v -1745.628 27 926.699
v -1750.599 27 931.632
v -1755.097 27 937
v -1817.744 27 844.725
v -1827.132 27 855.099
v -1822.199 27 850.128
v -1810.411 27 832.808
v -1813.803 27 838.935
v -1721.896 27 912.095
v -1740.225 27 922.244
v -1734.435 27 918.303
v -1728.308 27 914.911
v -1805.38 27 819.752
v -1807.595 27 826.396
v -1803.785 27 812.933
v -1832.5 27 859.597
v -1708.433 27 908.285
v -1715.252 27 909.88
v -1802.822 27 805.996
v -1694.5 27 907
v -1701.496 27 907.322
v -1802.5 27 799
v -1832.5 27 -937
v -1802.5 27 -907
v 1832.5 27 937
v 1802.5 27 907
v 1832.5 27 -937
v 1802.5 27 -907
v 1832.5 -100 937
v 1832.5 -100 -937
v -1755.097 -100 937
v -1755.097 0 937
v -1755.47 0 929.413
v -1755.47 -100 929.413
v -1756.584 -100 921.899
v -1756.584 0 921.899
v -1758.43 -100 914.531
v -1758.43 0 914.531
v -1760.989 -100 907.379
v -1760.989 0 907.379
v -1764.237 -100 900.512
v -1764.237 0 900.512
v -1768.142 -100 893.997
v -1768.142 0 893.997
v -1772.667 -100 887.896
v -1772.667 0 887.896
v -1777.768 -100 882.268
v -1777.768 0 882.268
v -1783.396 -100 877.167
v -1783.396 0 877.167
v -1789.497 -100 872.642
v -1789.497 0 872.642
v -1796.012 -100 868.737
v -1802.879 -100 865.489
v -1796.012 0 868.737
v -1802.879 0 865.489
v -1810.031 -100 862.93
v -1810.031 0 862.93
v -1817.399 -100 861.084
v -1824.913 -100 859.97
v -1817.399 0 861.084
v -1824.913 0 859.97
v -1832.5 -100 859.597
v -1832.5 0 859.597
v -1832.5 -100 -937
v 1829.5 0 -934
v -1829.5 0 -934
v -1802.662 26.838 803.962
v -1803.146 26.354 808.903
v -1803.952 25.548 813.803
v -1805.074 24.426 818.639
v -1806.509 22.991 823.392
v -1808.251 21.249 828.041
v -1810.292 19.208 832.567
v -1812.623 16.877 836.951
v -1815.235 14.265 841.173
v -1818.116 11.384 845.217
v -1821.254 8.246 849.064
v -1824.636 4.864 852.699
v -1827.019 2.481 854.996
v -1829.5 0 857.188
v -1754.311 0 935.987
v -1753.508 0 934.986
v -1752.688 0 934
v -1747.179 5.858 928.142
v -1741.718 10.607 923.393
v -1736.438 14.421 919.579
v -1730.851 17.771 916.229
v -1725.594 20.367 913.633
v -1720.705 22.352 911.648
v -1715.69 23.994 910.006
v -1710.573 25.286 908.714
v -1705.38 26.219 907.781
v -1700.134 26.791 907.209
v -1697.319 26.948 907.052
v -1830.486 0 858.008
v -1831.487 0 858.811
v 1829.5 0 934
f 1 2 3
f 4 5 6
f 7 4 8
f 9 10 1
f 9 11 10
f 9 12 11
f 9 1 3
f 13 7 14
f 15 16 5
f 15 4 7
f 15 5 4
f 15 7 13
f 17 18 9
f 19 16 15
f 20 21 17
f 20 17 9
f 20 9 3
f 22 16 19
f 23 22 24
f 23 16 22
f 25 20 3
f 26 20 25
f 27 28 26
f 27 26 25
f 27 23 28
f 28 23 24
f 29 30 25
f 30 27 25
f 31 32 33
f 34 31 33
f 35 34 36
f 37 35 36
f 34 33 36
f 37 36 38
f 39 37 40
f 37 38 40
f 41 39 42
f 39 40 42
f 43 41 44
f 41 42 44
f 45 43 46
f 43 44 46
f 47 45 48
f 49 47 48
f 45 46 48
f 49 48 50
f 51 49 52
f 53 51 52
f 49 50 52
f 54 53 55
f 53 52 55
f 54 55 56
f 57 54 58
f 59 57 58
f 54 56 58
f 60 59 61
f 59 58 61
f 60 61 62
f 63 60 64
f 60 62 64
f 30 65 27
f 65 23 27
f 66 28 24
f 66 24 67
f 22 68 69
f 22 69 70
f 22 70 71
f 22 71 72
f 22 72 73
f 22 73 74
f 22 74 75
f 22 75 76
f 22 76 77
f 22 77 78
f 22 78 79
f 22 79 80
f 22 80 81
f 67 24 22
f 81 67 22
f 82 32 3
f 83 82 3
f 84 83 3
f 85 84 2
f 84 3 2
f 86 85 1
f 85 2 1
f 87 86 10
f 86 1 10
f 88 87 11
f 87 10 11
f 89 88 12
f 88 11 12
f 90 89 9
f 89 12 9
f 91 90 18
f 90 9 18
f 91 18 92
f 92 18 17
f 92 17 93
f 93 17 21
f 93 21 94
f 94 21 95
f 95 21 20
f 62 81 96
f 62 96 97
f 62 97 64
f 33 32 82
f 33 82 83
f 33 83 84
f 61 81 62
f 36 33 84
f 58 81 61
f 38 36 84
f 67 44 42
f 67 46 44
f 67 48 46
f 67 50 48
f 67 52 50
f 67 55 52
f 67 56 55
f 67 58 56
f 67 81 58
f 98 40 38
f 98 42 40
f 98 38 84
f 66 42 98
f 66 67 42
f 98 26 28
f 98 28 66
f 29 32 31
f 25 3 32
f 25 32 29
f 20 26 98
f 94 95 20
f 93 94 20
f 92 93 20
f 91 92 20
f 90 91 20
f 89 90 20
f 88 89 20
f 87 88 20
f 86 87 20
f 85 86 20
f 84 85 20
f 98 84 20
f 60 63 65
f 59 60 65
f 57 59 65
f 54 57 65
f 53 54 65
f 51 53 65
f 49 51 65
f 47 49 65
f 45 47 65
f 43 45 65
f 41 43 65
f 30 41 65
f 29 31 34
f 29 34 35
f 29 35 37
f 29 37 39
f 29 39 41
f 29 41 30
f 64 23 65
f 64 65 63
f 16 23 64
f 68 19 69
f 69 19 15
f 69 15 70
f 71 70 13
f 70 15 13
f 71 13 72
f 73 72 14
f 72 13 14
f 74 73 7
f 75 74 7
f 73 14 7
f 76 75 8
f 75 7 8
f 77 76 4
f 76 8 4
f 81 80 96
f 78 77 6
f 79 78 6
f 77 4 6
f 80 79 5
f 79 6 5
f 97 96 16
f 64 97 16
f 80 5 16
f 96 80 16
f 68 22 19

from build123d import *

# Parameters (mm, degrees)
SZKIC4_W                    = 3665
SZKIC4_H                    = 1874
SZKIC4_W_2                  = 3569
SZKIC4_H_2                  = 1778
DODANIE_WYCI_GNI_CIE3_DEPTH = 27
SZKIC5_W                    = 3665
SZKIC5_H                    = 1874
DODANIE_WYCI_GNI_CIE4_DEPTH = 100
WYTNIJ_WYCI_GNI_CIE1_DEPTH  = 27
WYTNIJ_WYCI_GNI_CIE2_REACH  = 2062.589
SZKIC7_R                    = 77.40297037


with BuildPart() as part:
    # Szkic4 → Dodanie-wyciągnięcie3 (new body)
    with BuildSketch(Plane(origin=(0, 0, 0), x_dir=(1, 0, 0), z_dir=(0, 1, 0))):
        Rectangle(SZKIC4_W, SZKIC4_H)
        Rectangle(SZKIC4_W_2, SZKIC4_H_2, mode=Mode.SUBTRACT)
    extrude(amount=DODANIE_WYCI_GNI_CIE3_DEPTH)

    # Sfazowanie1
    # the kernel refuses this chamfer: 45 mm, written as the material it takes off along each edge
    with BuildSketch(Plane(origin=(-1784.5, 0, 889), x_dir=(0, 0.9996219169112966, -0.027495876610587087), z_dir=(1, 0, 0)), Plane(origin=(1784.5, 0, -889), x_dir=(0, 0.9996219169112966, 0.027495876610587087), z_dir=(-1, 0, 0))) as sfazowanie1_piece_1:
        with BuildLine():
            Line((46.290293783, 0), (-2.54462197, 46.220300708))
            Line((-2.54462197, 46.220300708), (-3.444281695, 46.19555442))
            ThreePointArc((-3.444281695, 46.19555442), (-1.535815218, 23.102902334), (-0.899659725, -0.024746289))
            Line((-0.899659725, -0.024746289), (0.024746289, -0.899659725))
            ThreePointArc((0.024746289, -0.899659725), (23.152394912, -0.263504233), (46.315040072, -0.899659725))
            Line((46.315040072, -0.899659725), (46.290293783, 0))
        make_face()
    extrude(amount=3569, mode=Mode.SUBTRACT)
    with BuildSketch(Plane(origin=(-1784.5, 0, -889), x_dir=(0.027495876610587087, 0.9996219169112966, 0), z_dir=(0, 0, 1)), Plane(origin=(1784.5, 0, 889), x_dir=(-0.027495876610587087, 0.9996219169112966, 0), z_dir=(0, 0, -1))) as sfazowanie1_piece_2:
        with BuildLine():
            Line((46.290293783, 0), (-2.54462197, 46.220300708))
            Line((-2.54462197, 46.220300708), (-3.444281695, 46.19555442))
            ThreePointArc((-3.444281695, 46.19555442), (-1.535815218, 23.102902334), (-0.899659725, -0.024746289))
            Line((-0.899659725, -0.024746289), (0.024746289, -0.899659725))
            ThreePointArc((0.024746289, -0.899659725), (23.152394912, -0.263504233), (46.315040072, -0.899659725))
            Line((46.315040072, -0.899659725), (46.290293783, 0))
        make_face()
    extrude(amount=1778, mode=Mode.SUBTRACT)
    with BuildSketch(Plane(origin=(-1784.5, 0, -889), x_dir=(0.027495876610587087, 0.9996219169112966, 0), z_dir=(0, 0, 1))) as sfazowanie1_piece_3a_section:
        with BuildLine():
            Line((46.290293783, 0), (-2.54462197, 46.220300708))
            Line((-2.54462197, 46.220300708), (-3.444281695, 46.19555442))
            ThreePointArc((-3.444281695, 46.19555442), (-1.535815218, 23.102902334), (-0.899659725, -0.024746289))
            Line((-0.899659725, -0.024746289), (0.024746289, -0.899659725))
            ThreePointArc((0.024746289, -0.899659725), (23.152394912, -0.263504233), (46.315040072, -0.899659725))
            Line((46.315040072, -0.899659725), (46.290293783, 0))
        make_face()
    sfazowanie1_piece_3a = extrude(amount=1893.725734458, mode=Mode.PRIVATE)
    sfazowanie1_piece_3a = split(sfazowanie1_piece_3a, bisect_by=Plane(origin=(-1799.340713206, 14.840713206, 889), z_dir=(0, 0, 1)), keep=Keep.TOP, mode=Mode.PRIVATE)
    with BuildSketch(Plane(origin=(-1900.225734458, 0, 889), x_dir=(0, 0.9996219169112966, -0.027495876610587087), z_dir=(1, 0, 0))) as sfazowanie1_piece_3b_section:
        with BuildLine():
            Line((46.290293783, 0), (-2.54462197, 46.220300708))
            Line((-2.54462197, 46.220300708), (-3.444281695, 46.19555442))
            ThreePointArc((-3.444281695, 46.19555442), (-1.535815218, 23.102902334), (-0.899659725, -0.024746289))
            Line((-0.899659725, -0.024746289), (0.024746289, -0.899659725))
            ThreePointArc((0.024746289, -0.899659725), (23.152394912, -0.263504233), (46.315040072, -0.899659725))
            Line((46.315040072, -0.899659725), (46.290293783, 0))
        make_face()
    sfazowanie1_piece_3b = extrude(amount=3684.725734458, mode=Mode.PRIVATE)
    sfazowanie1_piece_3b = split(sfazowanie1_piece_3b, bisect_by=Plane(origin=(-1784.5, 14.840713206, 903.840713206), z_dir=(-1, 0, 0)), keep=Keep.TOP, mode=Mode.PRIVATE)
    sfazowanie1_piece_3 = sfazowanie1_piece_3a & sfazowanie1_piece_3b
    add(sfazowanie1_piece_3, mode=Mode.SUBTRACT)
    with BuildSketch(Plane(origin=(1784.5, 0, 1004.725734458), x_dir=(-0.027495876610587087, 0.9996219169112966, 0), z_dir=(0, 0, -1))) as sfazowanie1_piece_4a_section:
        with BuildLine():
            Line((46.290293783, 0), (-2.54462197, 46.220300708))
            Line((-2.54462197, 46.220300708), (-3.444281695, 46.19555442))
            ThreePointArc((-3.444281695, 46.19555442), (-1.535815218, 23.102902334), (-0.899659725, -0.024746289))
            Line((-0.899659725, -0.024746289), (0.024746289, -0.899659725))
            ThreePointArc((0.024746289, -0.899659725), (23.152394912, -0.263504233), (46.315040072, -0.899659725))
            Line((46.315040072, -0.899659725), (46.290293783, 0))
        make_face()
    sfazowanie1_piece_4a = extrude(amount=1893.725734458, mode=Mode.PRIVATE)
    sfazowanie1_piece_4a = split(sfazowanie1_piece_4a, bisect_by=Plane(origin=(1799.340713206, 14.840713206, 889), z_dir=(0, 0, 1)), keep=Keep.TOP, mode=Mode.PRIVATE)
    with BuildSketch(Plane(origin=(-1784.5, 0, 889), x_dir=(0, 0.9996219169112966, -0.027495876610587087), z_dir=(1, 0, 0))) as sfazowanie1_piece_4b_section:
        with BuildLine():
            Line((46.290293783, 0), (-2.54462197, 46.220300708))
            Line((-2.54462197, 46.220300708), (-3.444281695, 46.19555442))
            ThreePointArc((-3.444281695, 46.19555442), (-1.535815218, 23.102902334), (-0.899659725, -0.024746289))
            Line((-0.899659725, -0.024746289), (0.024746289, -0.899659725))
            ThreePointArc((0.024746289, -0.899659725), (23.152394912, -0.263504233), (46.315040072, -0.899659725))
            Line((46.315040072, -0.899659725), (46.290293783, 0))
        make_face()
    sfazowanie1_piece_4b = extrude(amount=3684.725734458, mode=Mode.PRIVATE)
    sfazowanie1_piece_4b = split(sfazowanie1_piece_4b, bisect_by=Plane(origin=(1784.5, 14.840713206, 903.840713206), z_dir=(1, 0, 0)), keep=Keep.TOP, mode=Mode.PRIVATE)
    sfazowanie1_piece_4 = sfazowanie1_piece_4a & sfazowanie1_piece_4b
    add(sfazowanie1_piece_4, mode=Mode.SUBTRACT)
    with BuildSketch(Plane(origin=(-1784.5, 0, -1004.725734458), x_dir=(0.027495876610587087, 0.9996219169112966, 0), z_dir=(0, 0, 1))) as sfazowanie1_piece_5a_section:
        with BuildLine():
            Line((46.290293783, 0), (-2.54462197, 46.220300708))
            Line((-2.54462197, 46.220300708), (-3.444281695, 46.19555442))
            ThreePointArc((-3.444281695, 46.19555442), (-1.535815218, 23.102902334), (-0.899659725, -0.024746289))
            Line((-0.899659725, -0.024746289), (0.024746289, -0.899659725))
            ThreePointArc((0.024746289, -0.899659725), (23.152394912, -0.263504233), (46.315040072, -0.899659725))
            Line((46.315040072, -0.899659725), (46.290293783, 0))
        make_face()
    sfazowanie1_piece_5a = extrude(amount=1893.725734458, mode=Mode.PRIVATE)
    sfazowanie1_piece_5a = split(sfazowanie1_piece_5a, bisect_by=Plane(origin=(-1799.340713206, 14.840713206, -889), z_dir=(0, 0, -1)), keep=Keep.TOP, mode=Mode.PRIVATE)
    with BuildSketch(Plane(origin=(1784.5, 0, -889), x_dir=(0, 0.9996219169112966, 0.027495876610587087), z_dir=(-1, 0, 0))) as sfazowanie1_piece_5b_section:
        with BuildLine():
            Line((46.290293783, 0), (-2.54462197, 46.220300708))
            Line((-2.54462197, 46.220300708), (-3.444281695, 46.19555442))
            ThreePointArc((-3.444281695, 46.19555442), (-1.535815218, 23.102902334), (-0.899659725, -0.024746289))
            Line((-0.899659725, -0.024746289), (0.024746289, -0.899659725))
            ThreePointArc((0.024746289, -0.899659725), (23.152394912, -0.263504233), (46.315040072, -0.899659725))
            Line((46.315040072, -0.899659725), (46.290293783, 0))
        make_face()
    sfazowanie1_piece_5b = extrude(amount=3684.725734458, mode=Mode.PRIVATE)
    sfazowanie1_piece_5b = split(sfazowanie1_piece_5b, bisect_by=Plane(origin=(-1784.5, 14.840713206, -903.840713206), z_dir=(-1, 0, 0)), keep=Keep.TOP, mode=Mode.PRIVATE)
    sfazowanie1_piece_5 = sfazowanie1_piece_5a & sfazowanie1_piece_5b
    add(sfazowanie1_piece_5, mode=Mode.SUBTRACT)
    with BuildSketch(Plane(origin=(1900.225734458, 0, -889), x_dir=(0, 0.9996219169112966, 0.027495876610587087), z_dir=(-1, 0, 0))) as sfazowanie1_piece_6a_section:
        with BuildLine():
            Line((46.290293783, 0), (-2.54462197, 46.220300708))
            Line((-2.54462197, 46.220300708), (-3.444281695, 46.19555442))
            ThreePointArc((-3.444281695, 46.19555442), (-1.535815218, 23.102902334), (-0.899659725, -0.024746289))
            Line((-0.899659725, -0.024746289), (0.024746289, -0.899659725))
            ThreePointArc((0.024746289, -0.899659725), (23.152394912, -0.263504233), (46.315040072, -0.899659725))
            Line((46.315040072, -0.899659725), (46.290293783, 0))
        make_face()
    sfazowanie1_piece_6a = extrude(amount=3684.725734458, mode=Mode.PRIVATE)
    sfazowanie1_piece_6a = split(sfazowanie1_piece_6a, bisect_by=Plane(origin=(1784.5, 14.840713206, -903.840713206), z_dir=(1, 0, 0)), keep=Keep.TOP, mode=Mode.PRIVATE)
    with BuildSketch(Plane(origin=(1784.5, 0, 889), x_dir=(-0.027495876610587087, 0.9996219169112966, 0), z_dir=(0, 0, -1))) as sfazowanie1_piece_6b_section:
        with BuildLine():
            Line((46.290293783, 0), (-2.54462197, 46.220300708))
            Line((-2.54462197, 46.220300708), (-3.444281695, 46.19555442))
            ThreePointArc((-3.444281695, 46.19555442), (-1.535815218, 23.102902334), (-0.899659725, -0.024746289))
            Line((-0.899659725, -0.024746289), (0.024746289, -0.899659725))
            ThreePointArc((0.024746289, -0.899659725), (23.152394912, -0.263504233), (46.315040072, -0.899659725))
            Line((46.315040072, -0.899659725), (46.290293783, 0))
        make_face()
    sfazowanie1_piece_6b = extrude(amount=1893.725734458, mode=Mode.PRIVATE)
    sfazowanie1_piece_6b = split(sfazowanie1_piece_6b, bisect_by=Plane(origin=(1799.340713206, 14.840713206, -889), z_dir=(0, 0, -1)), keep=Keep.TOP, mode=Mode.PRIVATE)
    sfazowanie1_piece_6 = sfazowanie1_piece_6a & sfazowanie1_piece_6b
    add(sfazowanie1_piece_6, mode=Mode.SUBTRACT)

    # Szkic5 → Dodanie-wyciągnięcie4 (add)
    with BuildSketch(Plane.XZ):
        Rectangle(SZKIC5_W, SZKIC5_H)
    extrude(amount=DODANIE_WYCI_GNI_CIE4_DEPTH)

    # Szkic6 → Wytnij-wyciągnięcie1 (cut)
    with BuildSketch(Plane(origin=(0, 27, 0), x_dir=(1, 0, 0), z_dir=(0, 1, 0))):
        with BuildLine():
            Line((-1832.5, -859.59702963), (-1832.5, -937))
            Line((-1832.5, -937), (-1755.09702963, -937))
            ThreePointArc((-1755.09702963, -937), (-1728.308283009, -914.910615759), (-1694.5, -907))
            Line((-1694.5, -907), (-1802.5, -907))
            Line((-1802.5, -907), (-1802.5, -799))
            ThreePointArc((-1802.5, -799), (-1810.410615759, -832.808283009), (-1832.5, -859.59702963))
        make_face()
    extrude(amount=-WYTNIJ_WYCI_GNI_CIE1_DEPTH, mode=Mode.SUBTRACT)

    # Szkic7 → Wytnij-wyciągnięcie2 (cut, up to next)
    with BuildSketch(Plane(origin=(0, 0, 0), x_dir=(1, 0, 0), z_dir=(0, 1, 0)), mode=Mode.PRIVATE) as wytnij_wyci_gni_cie2_sk1:
        with Locations((-1832.5, -937)):
            Circle(SZKIC7_R)
    wytnij_wyci_gni_cie2_tool1 = extrude(wytnij_wyci_gni_cie2_sk1.sketch, amount=-WYTNIJ_WYCI_GNI_CIE2_REACH, mode=Mode.PRIVATE) & part.part
    add(wytnij_wyci_gni_cie2_tool1.solids().sort_by_distance((-1832.5, 0, 937))[0], mode=Mode.SUBTRACT)


solid = part.part
